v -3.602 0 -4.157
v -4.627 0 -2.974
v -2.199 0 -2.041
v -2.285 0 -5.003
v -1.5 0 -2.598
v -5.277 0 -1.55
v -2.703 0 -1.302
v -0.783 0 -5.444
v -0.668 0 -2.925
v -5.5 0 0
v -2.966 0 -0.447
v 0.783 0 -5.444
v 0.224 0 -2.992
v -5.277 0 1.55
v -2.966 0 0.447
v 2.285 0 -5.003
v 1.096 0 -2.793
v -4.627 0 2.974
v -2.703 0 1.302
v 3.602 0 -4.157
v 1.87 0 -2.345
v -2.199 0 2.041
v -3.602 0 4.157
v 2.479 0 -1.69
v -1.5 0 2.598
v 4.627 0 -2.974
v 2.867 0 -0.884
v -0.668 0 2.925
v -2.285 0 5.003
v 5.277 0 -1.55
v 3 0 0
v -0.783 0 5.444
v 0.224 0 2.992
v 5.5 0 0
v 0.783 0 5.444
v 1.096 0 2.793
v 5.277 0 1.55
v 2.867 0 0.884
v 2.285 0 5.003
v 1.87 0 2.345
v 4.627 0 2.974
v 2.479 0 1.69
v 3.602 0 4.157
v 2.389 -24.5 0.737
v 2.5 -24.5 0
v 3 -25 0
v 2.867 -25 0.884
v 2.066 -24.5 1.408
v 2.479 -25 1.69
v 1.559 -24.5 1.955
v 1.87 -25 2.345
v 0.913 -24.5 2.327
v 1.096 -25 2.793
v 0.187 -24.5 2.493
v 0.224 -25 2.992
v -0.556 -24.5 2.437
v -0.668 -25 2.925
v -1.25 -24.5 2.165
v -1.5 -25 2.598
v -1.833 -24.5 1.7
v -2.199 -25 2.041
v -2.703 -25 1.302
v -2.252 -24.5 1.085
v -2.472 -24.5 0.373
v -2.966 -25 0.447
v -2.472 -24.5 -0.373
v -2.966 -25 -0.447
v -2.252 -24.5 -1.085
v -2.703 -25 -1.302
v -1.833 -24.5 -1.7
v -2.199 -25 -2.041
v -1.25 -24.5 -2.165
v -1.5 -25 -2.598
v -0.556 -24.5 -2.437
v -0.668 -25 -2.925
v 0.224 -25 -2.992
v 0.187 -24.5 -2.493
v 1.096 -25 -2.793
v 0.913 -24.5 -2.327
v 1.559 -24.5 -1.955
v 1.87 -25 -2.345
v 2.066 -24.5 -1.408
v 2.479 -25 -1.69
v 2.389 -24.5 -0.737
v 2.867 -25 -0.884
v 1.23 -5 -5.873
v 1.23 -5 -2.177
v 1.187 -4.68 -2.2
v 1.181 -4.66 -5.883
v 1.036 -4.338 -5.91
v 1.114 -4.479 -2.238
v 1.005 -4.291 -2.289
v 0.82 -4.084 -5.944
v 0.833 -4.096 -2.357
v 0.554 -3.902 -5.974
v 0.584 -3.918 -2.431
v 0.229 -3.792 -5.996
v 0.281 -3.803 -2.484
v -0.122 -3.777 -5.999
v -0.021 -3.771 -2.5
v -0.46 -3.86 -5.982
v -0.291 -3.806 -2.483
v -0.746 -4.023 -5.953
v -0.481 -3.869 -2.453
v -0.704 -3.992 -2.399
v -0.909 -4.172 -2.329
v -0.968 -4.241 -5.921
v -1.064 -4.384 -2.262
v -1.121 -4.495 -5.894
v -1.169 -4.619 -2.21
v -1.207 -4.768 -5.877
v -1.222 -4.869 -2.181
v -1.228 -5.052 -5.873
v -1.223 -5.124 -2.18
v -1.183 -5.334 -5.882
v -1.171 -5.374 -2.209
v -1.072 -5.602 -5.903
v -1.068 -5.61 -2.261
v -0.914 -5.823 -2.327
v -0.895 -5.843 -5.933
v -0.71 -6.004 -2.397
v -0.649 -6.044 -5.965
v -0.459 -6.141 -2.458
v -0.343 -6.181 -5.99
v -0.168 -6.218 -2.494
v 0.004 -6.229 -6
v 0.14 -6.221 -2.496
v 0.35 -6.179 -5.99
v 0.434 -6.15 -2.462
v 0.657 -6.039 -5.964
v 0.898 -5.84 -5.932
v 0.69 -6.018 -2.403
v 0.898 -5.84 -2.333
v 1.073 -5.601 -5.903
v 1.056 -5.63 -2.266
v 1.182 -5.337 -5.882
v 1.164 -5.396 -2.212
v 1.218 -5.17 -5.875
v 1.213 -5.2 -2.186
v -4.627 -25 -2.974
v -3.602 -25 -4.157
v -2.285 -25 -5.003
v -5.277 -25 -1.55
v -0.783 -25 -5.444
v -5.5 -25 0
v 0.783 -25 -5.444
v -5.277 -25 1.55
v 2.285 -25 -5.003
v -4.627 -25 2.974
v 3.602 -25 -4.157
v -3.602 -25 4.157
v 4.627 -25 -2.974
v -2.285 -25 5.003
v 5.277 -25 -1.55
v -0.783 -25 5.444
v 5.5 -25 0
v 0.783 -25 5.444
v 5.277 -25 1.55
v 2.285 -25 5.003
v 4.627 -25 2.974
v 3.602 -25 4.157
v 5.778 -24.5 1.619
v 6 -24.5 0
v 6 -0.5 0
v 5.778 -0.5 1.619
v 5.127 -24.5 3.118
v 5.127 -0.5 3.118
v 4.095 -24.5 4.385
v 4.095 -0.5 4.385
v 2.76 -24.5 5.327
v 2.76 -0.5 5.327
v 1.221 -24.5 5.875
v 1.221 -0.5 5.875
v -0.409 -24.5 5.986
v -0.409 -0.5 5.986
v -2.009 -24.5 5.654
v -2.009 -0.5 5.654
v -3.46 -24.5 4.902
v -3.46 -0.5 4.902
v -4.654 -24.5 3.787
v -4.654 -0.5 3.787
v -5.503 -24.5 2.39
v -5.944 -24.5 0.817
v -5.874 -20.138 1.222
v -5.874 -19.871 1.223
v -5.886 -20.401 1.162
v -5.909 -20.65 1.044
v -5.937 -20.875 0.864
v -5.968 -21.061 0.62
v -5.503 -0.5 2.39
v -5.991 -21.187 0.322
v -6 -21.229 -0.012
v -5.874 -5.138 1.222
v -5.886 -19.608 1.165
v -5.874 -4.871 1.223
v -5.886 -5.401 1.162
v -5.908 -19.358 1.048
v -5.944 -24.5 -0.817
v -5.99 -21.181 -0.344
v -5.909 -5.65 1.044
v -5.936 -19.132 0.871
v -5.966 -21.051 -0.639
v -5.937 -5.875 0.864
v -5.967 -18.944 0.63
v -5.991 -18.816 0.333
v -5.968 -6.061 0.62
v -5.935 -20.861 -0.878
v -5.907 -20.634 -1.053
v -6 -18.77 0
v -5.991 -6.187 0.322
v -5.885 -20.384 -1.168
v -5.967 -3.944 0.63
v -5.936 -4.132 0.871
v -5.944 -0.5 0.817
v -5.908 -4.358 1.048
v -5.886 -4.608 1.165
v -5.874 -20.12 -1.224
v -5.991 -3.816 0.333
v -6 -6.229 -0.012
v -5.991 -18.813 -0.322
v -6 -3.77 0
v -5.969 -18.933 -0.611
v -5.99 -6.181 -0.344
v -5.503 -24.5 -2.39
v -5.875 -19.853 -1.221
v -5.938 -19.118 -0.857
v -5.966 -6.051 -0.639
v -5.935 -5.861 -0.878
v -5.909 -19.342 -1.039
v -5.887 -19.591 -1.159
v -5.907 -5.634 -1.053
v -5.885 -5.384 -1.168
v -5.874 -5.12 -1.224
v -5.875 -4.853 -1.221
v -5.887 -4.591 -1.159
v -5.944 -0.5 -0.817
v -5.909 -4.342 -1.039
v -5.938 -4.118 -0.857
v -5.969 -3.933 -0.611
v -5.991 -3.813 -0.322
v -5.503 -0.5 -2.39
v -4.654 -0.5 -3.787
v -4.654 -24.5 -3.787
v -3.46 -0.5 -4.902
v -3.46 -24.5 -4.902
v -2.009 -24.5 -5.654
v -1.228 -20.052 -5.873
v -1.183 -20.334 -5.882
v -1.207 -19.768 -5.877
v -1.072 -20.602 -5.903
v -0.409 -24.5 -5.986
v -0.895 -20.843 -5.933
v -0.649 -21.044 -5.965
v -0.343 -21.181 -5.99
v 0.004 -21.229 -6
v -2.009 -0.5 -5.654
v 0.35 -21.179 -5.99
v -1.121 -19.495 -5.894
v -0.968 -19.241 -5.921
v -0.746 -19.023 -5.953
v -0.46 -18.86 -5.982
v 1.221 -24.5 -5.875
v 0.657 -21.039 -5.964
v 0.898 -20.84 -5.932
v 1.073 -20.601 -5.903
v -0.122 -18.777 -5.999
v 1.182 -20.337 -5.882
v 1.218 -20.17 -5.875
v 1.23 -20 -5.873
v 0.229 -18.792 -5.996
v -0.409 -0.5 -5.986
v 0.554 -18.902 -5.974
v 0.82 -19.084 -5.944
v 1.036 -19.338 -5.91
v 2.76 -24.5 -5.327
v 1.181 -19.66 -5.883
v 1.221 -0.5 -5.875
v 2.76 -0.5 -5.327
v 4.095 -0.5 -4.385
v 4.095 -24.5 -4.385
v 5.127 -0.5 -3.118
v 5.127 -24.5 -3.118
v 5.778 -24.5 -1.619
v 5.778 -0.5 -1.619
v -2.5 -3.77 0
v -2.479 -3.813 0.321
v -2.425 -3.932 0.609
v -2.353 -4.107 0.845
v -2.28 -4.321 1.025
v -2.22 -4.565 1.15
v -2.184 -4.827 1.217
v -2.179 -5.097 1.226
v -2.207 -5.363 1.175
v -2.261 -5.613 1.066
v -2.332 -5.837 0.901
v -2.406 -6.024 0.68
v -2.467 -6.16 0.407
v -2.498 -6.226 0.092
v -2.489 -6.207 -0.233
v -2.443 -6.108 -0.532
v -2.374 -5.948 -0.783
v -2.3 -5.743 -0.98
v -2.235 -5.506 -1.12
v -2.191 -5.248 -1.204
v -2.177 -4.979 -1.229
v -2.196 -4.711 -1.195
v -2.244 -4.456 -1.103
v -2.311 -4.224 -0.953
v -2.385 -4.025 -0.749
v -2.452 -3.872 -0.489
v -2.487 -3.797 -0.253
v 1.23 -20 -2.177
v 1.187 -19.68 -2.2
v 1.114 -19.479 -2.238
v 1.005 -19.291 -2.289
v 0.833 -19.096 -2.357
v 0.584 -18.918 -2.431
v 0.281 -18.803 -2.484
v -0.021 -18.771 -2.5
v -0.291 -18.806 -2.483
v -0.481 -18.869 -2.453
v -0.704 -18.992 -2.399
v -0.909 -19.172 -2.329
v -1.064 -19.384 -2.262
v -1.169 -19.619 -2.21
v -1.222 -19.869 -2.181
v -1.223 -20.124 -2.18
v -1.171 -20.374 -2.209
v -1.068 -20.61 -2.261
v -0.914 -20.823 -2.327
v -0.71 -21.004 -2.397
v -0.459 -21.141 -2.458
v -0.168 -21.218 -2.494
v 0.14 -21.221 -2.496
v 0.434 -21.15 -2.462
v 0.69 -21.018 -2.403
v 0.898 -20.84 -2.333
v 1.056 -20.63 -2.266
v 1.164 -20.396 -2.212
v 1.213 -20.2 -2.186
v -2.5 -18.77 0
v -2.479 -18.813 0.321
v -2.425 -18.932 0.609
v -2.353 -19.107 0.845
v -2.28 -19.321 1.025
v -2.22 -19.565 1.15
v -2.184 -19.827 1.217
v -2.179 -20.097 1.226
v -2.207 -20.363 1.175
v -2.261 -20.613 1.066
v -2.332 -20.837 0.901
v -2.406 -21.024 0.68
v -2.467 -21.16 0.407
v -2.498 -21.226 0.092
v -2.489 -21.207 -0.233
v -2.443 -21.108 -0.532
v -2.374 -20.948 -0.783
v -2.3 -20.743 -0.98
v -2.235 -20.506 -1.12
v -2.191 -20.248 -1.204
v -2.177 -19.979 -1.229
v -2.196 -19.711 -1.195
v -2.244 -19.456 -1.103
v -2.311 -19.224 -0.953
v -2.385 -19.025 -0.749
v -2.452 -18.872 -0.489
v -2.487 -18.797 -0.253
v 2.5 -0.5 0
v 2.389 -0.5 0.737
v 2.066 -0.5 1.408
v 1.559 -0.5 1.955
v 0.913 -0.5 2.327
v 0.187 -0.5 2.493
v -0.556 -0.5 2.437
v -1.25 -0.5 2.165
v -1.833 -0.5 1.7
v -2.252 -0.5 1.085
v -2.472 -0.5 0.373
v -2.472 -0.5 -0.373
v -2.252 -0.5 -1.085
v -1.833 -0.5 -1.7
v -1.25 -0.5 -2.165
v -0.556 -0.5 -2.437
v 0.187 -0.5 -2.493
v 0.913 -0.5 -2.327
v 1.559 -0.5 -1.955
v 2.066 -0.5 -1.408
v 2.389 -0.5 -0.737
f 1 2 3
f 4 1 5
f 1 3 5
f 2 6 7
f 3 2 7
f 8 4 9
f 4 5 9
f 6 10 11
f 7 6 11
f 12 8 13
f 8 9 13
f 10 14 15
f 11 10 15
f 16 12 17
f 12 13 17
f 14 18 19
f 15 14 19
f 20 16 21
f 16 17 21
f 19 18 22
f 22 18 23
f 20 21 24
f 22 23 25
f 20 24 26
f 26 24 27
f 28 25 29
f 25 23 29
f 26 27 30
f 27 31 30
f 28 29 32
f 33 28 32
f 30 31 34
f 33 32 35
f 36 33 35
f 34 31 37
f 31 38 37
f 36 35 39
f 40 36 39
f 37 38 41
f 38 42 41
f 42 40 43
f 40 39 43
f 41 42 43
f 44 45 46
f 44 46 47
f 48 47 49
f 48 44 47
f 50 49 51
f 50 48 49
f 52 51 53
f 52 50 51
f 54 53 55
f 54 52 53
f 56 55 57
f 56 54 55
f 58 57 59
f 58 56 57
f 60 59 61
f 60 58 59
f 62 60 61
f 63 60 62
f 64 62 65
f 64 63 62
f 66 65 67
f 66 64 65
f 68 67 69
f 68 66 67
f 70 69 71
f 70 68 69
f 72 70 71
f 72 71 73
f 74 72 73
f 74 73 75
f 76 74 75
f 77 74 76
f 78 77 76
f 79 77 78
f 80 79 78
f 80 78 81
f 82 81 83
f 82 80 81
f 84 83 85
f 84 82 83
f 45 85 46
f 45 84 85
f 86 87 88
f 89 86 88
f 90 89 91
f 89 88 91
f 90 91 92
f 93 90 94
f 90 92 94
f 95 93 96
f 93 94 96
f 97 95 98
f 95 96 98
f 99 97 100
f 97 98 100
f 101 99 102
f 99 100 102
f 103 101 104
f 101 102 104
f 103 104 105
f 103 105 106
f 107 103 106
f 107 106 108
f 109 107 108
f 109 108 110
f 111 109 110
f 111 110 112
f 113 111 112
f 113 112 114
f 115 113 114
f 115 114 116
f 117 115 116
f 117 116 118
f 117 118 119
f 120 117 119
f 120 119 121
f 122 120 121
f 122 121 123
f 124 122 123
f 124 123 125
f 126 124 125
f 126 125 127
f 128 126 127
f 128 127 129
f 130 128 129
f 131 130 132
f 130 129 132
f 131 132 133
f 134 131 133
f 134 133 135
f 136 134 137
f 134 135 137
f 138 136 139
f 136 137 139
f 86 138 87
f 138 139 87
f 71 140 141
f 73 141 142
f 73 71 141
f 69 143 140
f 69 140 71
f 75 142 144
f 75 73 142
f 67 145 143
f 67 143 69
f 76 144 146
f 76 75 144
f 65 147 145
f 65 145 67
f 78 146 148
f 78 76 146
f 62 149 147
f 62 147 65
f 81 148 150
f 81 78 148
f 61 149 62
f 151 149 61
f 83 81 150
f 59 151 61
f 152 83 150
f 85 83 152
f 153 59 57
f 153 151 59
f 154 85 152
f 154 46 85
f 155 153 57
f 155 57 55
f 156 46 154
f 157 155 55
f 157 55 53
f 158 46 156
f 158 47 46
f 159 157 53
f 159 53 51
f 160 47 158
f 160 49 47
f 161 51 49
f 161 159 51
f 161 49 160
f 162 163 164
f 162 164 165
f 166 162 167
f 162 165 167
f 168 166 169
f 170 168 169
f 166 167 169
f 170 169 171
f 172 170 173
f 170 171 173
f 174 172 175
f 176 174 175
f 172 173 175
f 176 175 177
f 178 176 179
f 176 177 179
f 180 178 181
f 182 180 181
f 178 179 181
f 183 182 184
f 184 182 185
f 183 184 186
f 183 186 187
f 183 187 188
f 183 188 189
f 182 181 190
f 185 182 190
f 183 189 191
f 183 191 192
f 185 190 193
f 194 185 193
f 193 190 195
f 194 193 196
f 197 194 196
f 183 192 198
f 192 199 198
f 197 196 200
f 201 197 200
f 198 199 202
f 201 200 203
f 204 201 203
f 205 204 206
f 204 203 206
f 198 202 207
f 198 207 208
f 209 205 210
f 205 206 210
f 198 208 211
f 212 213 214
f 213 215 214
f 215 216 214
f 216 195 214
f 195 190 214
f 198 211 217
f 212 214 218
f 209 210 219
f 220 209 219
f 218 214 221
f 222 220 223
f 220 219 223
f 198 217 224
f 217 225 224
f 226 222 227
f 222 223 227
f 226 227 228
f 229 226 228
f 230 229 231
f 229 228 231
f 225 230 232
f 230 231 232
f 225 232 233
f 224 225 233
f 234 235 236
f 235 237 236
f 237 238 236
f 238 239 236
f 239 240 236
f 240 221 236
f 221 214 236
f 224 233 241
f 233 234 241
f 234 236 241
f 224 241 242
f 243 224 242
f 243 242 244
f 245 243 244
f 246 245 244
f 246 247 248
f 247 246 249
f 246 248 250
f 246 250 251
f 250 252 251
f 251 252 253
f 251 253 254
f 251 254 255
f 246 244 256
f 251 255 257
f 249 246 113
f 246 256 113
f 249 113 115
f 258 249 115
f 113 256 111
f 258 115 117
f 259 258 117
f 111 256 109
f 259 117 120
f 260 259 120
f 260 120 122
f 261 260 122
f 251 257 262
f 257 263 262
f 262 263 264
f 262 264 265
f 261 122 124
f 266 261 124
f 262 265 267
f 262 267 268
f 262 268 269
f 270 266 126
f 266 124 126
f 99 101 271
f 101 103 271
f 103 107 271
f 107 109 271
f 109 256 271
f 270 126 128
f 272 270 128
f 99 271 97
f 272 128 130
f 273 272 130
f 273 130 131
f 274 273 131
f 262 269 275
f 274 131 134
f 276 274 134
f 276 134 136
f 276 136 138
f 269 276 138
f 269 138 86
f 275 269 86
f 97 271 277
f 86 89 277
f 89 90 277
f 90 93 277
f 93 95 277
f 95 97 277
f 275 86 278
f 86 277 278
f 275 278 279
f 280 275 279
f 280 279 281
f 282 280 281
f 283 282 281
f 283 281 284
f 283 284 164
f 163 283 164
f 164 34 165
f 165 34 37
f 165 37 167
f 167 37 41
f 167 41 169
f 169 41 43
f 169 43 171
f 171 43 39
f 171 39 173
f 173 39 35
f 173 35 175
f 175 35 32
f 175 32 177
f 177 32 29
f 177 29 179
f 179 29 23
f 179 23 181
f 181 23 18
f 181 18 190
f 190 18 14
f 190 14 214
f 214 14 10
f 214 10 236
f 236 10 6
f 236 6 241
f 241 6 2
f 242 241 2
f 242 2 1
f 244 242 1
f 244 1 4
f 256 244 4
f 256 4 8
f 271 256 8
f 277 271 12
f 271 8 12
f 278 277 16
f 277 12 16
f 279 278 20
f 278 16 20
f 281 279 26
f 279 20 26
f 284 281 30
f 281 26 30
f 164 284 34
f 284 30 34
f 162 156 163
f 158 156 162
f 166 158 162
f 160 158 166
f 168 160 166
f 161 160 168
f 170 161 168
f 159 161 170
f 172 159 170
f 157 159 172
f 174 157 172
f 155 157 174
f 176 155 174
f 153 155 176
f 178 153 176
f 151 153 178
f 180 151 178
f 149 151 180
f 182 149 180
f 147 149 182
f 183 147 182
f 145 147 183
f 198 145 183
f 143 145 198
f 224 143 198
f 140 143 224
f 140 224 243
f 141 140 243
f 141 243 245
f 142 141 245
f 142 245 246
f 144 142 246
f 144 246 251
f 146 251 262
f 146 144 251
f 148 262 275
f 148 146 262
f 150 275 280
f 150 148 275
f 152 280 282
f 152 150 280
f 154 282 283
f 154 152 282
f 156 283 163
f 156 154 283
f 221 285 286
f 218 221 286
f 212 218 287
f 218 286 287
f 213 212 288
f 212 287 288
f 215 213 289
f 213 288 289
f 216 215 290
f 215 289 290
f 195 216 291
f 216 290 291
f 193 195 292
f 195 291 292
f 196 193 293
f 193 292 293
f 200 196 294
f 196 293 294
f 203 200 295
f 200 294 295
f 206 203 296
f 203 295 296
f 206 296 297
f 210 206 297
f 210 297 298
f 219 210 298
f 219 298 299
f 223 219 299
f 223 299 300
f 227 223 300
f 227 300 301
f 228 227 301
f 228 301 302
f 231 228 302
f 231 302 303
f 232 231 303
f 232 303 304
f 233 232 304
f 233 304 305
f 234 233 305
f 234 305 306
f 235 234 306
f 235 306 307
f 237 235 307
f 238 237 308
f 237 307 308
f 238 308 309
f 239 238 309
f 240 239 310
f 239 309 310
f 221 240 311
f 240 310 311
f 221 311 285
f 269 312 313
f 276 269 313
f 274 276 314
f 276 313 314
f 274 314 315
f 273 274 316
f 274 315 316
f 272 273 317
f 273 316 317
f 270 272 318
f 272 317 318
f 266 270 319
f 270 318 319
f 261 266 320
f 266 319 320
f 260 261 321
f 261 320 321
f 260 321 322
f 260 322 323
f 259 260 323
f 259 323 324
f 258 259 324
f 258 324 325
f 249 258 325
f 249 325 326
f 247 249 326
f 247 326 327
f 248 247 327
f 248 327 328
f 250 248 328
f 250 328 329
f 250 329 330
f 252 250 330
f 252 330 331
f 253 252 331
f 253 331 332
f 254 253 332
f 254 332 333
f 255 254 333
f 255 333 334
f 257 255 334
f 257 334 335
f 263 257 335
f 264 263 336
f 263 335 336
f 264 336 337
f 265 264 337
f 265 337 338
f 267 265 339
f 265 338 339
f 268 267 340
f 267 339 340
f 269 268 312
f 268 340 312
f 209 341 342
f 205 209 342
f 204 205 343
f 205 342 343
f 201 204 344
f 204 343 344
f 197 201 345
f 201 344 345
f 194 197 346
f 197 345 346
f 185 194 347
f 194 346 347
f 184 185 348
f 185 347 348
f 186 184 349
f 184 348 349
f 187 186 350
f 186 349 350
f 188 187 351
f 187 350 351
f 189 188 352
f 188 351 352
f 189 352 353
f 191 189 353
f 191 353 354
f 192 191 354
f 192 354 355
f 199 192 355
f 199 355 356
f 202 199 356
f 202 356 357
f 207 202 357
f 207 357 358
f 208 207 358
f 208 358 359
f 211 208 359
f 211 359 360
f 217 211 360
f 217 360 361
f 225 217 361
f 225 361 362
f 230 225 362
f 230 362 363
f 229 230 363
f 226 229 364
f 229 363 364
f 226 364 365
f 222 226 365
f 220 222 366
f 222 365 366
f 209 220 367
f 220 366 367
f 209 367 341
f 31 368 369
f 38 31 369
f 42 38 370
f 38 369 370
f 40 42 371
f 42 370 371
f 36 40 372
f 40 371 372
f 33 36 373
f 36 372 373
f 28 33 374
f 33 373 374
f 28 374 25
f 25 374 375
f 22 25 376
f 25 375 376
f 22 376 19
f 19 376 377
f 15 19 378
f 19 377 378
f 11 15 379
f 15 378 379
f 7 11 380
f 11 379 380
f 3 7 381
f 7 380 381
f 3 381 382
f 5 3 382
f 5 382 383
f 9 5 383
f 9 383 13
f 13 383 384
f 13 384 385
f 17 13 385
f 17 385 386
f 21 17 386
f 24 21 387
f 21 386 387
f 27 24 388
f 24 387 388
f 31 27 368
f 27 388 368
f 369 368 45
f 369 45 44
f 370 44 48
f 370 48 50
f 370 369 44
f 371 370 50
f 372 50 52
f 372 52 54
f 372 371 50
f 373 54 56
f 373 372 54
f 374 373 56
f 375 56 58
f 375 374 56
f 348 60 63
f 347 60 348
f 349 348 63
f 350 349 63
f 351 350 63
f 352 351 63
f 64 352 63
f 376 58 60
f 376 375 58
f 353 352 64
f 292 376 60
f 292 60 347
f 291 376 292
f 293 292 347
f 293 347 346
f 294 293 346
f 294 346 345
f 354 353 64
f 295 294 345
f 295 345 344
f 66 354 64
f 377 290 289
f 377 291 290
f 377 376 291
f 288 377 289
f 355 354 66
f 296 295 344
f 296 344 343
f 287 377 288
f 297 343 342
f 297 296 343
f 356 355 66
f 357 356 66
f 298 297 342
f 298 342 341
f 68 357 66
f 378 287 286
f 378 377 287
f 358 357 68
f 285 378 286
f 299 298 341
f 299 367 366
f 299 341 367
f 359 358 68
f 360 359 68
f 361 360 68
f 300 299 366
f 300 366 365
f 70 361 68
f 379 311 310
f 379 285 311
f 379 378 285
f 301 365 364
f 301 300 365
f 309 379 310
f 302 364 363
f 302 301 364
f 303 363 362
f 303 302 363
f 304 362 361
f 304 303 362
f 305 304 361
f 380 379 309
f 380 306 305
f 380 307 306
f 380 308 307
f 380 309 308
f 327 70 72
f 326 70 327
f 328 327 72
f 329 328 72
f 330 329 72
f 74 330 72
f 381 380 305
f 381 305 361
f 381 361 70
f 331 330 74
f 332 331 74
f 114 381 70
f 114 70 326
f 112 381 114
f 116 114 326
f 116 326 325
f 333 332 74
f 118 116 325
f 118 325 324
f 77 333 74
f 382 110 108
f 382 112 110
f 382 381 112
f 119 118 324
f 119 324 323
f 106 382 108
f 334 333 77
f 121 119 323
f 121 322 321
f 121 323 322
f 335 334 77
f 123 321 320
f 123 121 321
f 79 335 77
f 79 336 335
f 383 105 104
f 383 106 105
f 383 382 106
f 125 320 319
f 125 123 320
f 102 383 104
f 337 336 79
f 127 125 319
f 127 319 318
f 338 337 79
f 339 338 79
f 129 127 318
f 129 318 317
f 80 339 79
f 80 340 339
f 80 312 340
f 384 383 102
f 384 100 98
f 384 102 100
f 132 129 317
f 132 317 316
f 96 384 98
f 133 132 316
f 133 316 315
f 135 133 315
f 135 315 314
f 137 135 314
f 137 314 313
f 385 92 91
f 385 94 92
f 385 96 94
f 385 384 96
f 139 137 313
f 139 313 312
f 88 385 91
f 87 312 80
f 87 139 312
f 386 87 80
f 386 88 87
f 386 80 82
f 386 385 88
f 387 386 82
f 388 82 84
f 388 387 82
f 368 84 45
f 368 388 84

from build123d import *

# Parameters (mm, degrees)
F0_R     = 6
F0_R_2   = 2.5
F1_DEPTH = 25
F2_R     = 1.2295
F3_DEPTH = 25
F4_R     = 1.2295
F5_DEPTH = 25
F6_SIZE  = 0.5


with BuildPart() as f1:
    # F0 (on Front) → F1 (new body)
    with BuildSketch(Plane.XZ):
        Circle(F0_R)
        Circle(F0_R_2, mode=Mode.SUBTRACT)
    extrude(amount=F1_DEPTH)

    # F2 (on Top) → F3 (cut)
    with BuildSketch(Plane.XY):
        with Locations((0, -5)):
            Circle(F2_R)
        with Locations((0, -20)):
            Circle(F2_R)
    extrude(amount=-F3_DEPTH, mode=Mode.SUBTRACT)

    # F4 (on Right) → F5 (cut)
    with BuildSketch(Plane.YZ):
        with Locations((-5, 0)):
            Circle(F4_R)
        with Locations((-20, 0)):
            Circle(F4_R)
    extrude(amount=-F5_DEPTH, mode=Mode.SUBTRACT)

    # F6
    f6_edges = [f1.edges().sort_by_distance(p)[0] for p in [
        (-6, -25, 0),
        (-2.5, -25, 0),
        (-6, 0, 0),
        (-2.5, 0, 0),
    ]]
    chamfer(f6_edges, length=F6_SIZE)


solid = f1.part
